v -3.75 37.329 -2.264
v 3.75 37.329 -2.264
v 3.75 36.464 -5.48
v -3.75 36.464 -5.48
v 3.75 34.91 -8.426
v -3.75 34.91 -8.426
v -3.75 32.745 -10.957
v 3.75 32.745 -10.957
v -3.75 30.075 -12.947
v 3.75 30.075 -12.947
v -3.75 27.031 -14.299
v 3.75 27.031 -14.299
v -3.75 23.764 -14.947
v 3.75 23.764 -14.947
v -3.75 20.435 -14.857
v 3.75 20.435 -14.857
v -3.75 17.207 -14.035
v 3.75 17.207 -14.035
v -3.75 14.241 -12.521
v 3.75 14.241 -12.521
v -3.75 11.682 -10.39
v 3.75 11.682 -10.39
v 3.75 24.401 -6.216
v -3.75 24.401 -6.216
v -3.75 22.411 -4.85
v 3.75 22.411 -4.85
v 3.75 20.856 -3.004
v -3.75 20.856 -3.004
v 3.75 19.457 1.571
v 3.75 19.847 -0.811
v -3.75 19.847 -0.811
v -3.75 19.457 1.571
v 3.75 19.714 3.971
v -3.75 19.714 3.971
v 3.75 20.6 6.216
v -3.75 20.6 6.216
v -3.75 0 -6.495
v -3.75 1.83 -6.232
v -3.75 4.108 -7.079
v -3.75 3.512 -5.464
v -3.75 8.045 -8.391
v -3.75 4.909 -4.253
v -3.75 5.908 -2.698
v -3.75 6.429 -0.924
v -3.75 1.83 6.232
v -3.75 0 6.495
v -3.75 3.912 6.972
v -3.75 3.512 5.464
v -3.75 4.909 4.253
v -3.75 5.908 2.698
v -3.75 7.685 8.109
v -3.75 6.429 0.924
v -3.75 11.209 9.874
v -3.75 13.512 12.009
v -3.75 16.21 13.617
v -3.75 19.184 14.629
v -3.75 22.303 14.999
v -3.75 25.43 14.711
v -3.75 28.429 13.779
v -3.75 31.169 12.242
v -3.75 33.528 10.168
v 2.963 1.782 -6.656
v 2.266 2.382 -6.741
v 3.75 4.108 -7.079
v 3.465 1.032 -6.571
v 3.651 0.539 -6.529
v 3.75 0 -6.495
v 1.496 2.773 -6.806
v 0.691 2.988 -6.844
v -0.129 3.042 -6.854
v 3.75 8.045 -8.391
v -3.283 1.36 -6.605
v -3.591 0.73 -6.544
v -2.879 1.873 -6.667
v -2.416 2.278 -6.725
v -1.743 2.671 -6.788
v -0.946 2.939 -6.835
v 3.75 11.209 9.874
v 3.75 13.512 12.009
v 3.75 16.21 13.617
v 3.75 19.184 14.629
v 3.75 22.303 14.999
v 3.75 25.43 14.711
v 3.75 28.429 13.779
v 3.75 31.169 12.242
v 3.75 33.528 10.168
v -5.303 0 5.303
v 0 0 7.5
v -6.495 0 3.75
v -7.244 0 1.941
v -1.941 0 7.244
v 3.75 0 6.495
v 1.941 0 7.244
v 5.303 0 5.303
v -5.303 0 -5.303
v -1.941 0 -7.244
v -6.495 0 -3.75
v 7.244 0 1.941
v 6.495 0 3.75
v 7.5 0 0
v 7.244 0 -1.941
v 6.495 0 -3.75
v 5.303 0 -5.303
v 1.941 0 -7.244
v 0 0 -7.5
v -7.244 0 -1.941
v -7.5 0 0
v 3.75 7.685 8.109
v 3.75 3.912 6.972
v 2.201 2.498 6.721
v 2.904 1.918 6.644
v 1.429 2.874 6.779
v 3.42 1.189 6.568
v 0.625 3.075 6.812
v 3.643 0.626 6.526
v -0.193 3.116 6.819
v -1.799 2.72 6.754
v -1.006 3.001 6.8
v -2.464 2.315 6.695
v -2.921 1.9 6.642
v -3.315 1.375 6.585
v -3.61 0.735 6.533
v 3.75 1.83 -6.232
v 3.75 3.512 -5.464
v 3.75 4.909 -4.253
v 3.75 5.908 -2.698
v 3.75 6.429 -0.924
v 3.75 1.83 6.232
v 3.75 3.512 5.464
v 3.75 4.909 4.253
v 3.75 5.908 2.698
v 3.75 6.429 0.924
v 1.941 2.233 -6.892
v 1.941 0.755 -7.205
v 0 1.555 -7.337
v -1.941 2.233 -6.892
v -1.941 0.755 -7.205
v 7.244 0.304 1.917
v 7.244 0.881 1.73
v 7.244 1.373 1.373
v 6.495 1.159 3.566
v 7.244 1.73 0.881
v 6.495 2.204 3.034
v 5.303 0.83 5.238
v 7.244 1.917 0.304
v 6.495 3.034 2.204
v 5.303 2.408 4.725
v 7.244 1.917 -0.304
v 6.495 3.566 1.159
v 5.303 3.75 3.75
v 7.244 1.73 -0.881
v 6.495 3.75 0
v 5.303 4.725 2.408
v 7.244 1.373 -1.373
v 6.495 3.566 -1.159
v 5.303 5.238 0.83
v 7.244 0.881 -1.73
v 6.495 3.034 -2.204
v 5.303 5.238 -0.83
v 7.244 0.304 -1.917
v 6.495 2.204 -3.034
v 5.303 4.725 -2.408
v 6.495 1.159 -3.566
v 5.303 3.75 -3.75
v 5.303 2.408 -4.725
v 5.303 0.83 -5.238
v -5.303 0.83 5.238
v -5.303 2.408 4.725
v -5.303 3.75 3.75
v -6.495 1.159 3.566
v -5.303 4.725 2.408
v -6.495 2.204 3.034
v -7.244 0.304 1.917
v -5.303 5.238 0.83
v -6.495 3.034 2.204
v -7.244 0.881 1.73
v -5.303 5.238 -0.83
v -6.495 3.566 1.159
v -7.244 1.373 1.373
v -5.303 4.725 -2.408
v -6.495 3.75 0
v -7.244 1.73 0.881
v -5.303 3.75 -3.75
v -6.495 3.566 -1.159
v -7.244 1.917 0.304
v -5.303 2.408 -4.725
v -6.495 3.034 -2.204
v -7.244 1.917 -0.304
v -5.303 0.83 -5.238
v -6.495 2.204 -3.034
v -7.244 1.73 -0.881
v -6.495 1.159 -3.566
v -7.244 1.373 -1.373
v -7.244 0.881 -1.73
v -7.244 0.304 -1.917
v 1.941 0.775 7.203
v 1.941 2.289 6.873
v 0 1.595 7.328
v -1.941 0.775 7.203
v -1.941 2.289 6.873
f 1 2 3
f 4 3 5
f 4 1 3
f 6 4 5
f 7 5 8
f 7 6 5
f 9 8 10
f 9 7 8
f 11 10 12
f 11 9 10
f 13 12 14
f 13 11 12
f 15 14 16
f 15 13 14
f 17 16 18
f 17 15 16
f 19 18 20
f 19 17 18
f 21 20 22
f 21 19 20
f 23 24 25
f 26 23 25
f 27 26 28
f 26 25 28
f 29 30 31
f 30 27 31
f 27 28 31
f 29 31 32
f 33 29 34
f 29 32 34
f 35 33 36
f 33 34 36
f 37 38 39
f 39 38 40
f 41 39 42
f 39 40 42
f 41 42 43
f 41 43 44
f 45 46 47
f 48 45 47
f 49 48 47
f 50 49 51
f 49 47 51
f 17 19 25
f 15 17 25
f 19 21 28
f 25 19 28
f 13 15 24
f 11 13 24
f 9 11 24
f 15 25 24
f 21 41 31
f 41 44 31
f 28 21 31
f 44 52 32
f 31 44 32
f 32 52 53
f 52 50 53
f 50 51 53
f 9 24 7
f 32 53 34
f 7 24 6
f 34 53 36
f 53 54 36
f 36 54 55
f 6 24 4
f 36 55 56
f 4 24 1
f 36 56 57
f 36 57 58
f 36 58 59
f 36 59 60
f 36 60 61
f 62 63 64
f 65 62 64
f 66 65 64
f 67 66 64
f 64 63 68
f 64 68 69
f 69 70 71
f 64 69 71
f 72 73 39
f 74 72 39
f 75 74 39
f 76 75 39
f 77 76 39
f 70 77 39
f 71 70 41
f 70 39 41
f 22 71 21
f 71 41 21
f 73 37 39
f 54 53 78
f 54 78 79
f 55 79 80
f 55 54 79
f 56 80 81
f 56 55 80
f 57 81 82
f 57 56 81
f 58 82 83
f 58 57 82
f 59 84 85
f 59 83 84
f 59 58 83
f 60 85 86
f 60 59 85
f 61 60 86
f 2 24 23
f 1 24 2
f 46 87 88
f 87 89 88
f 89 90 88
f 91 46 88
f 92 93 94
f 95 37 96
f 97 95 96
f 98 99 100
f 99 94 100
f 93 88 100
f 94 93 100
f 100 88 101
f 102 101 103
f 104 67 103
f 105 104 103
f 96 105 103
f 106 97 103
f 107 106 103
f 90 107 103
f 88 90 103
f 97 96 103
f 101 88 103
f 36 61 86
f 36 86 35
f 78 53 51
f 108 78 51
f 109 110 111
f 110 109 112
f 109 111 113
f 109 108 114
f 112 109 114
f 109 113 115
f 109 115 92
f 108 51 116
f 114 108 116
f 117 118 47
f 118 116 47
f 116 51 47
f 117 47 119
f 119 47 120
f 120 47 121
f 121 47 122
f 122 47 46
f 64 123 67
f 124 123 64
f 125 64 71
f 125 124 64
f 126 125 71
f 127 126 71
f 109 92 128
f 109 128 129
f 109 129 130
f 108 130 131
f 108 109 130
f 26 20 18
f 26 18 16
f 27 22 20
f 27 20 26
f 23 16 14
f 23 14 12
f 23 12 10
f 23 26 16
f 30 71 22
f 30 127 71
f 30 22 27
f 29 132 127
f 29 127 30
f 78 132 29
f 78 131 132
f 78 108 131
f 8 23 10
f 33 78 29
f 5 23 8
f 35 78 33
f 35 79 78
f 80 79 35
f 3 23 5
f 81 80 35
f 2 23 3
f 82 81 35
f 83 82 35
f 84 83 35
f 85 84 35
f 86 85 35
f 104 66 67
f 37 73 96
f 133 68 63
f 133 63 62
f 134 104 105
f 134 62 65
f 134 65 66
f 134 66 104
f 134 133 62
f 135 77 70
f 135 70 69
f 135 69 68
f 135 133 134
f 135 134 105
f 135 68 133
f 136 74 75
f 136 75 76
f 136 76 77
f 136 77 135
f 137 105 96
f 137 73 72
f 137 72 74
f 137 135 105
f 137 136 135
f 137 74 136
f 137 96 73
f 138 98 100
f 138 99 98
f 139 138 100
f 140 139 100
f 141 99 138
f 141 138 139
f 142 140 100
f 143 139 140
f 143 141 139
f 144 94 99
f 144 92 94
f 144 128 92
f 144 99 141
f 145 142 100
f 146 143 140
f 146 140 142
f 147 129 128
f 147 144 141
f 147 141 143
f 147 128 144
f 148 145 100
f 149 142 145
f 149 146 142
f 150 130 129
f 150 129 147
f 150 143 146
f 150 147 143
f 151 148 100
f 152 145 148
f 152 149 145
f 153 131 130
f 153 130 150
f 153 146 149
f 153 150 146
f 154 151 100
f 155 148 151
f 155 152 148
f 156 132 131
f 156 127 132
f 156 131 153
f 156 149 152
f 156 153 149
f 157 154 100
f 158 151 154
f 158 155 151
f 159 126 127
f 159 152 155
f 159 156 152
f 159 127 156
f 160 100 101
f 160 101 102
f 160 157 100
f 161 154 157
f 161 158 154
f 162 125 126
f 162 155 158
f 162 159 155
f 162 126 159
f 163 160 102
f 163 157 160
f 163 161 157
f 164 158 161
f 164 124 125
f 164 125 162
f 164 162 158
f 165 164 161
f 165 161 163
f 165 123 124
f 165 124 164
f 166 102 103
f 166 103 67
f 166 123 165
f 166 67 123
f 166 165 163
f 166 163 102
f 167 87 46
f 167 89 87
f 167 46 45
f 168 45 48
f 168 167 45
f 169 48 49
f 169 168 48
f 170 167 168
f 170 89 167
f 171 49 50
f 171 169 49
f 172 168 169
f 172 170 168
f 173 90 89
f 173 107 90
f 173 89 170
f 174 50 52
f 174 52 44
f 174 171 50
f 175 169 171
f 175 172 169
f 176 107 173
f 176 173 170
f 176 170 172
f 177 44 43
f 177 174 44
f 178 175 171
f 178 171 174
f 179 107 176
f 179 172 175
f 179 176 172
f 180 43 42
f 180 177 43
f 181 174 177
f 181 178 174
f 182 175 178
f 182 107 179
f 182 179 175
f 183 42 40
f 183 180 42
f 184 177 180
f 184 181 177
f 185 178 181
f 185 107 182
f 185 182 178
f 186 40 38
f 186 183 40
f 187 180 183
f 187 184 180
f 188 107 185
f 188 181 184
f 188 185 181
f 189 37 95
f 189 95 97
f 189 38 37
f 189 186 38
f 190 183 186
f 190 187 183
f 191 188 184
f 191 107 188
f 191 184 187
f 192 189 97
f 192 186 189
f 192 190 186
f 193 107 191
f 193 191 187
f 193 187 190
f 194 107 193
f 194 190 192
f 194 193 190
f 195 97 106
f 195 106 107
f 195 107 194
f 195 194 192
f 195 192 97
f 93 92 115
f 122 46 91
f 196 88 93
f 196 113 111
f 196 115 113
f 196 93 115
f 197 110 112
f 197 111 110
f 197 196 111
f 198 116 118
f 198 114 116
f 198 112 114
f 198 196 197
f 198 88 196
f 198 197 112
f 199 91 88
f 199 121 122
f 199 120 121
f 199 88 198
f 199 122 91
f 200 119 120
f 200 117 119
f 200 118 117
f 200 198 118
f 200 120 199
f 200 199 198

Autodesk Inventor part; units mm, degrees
ref_plane "YZ Plane" through (0, 0, 0) normal (1, 0, 0) x (0, 1, 0)
ref_plane "XZ Plane" through (0, 0, 0) normal (0, 1, 0) x (-1, 0, 0)
ref_plane "XY Plane" through (0, 0, 0) normal (0, 0, 1) x (1, 0, 0)
sketch "Sketch1" plane through (0, 0, 0) normal (0, 0, 1) x (1, 0, 0)
  arc A0 (7.5, 0) -> (-7.5, 0) centre (0, 0) ccw
  line L0 (-7.5, 0) -> (7.5, 0)
  dimension "d2" = 7.5
revolve "Revolution1" add sketch "Sketch1" angle 180 mid plane about axis through (-7.5, 0, 0) along (1, 0, 0)
sketch "Sketch2" plane through (0, 0, 0) normal (1, 0, 0) x (0, 1, 0)
  line L0 (24.4009, -6.216) -> (37.3287, -2.2636)
  line L1 (33.5279, 10.1684) -> (20.6001, 6.216)
  arc A0 (20.6001, 6.216) -> (24.4009, -6.216) centre (28.4534, 1.82) ccw
  arc A1 (33.5279, 10.1684) -> (11.2086, 9.8739) centre (22.5005, 0) ccw
  arc A2 (11.6815, -10.3899) -> (37.3287, -2.2636) centre (22.5005, 0) ccw
  arc A3 (11.6815, -10.3899) -> (0, -6.4952) centre (-1.1685, -29.4655) ccw
  arc A4 (0, 6.4952) -> (11.2086, 9.8739) centre (-0.8152, 29.4807) ccw
  line L2 (0, -6.4952) -> (0, 6.4952)
  line L3 (0, 7.5) -> (0, -7.5) projected
  point P0 (0, 0)
  dimension "d15" = 23
  dimension "d16" = 23
extrude "Extrusion1" add sketch "Sketch2" along normal mid plane 7.5
properties part number "Spanner"
